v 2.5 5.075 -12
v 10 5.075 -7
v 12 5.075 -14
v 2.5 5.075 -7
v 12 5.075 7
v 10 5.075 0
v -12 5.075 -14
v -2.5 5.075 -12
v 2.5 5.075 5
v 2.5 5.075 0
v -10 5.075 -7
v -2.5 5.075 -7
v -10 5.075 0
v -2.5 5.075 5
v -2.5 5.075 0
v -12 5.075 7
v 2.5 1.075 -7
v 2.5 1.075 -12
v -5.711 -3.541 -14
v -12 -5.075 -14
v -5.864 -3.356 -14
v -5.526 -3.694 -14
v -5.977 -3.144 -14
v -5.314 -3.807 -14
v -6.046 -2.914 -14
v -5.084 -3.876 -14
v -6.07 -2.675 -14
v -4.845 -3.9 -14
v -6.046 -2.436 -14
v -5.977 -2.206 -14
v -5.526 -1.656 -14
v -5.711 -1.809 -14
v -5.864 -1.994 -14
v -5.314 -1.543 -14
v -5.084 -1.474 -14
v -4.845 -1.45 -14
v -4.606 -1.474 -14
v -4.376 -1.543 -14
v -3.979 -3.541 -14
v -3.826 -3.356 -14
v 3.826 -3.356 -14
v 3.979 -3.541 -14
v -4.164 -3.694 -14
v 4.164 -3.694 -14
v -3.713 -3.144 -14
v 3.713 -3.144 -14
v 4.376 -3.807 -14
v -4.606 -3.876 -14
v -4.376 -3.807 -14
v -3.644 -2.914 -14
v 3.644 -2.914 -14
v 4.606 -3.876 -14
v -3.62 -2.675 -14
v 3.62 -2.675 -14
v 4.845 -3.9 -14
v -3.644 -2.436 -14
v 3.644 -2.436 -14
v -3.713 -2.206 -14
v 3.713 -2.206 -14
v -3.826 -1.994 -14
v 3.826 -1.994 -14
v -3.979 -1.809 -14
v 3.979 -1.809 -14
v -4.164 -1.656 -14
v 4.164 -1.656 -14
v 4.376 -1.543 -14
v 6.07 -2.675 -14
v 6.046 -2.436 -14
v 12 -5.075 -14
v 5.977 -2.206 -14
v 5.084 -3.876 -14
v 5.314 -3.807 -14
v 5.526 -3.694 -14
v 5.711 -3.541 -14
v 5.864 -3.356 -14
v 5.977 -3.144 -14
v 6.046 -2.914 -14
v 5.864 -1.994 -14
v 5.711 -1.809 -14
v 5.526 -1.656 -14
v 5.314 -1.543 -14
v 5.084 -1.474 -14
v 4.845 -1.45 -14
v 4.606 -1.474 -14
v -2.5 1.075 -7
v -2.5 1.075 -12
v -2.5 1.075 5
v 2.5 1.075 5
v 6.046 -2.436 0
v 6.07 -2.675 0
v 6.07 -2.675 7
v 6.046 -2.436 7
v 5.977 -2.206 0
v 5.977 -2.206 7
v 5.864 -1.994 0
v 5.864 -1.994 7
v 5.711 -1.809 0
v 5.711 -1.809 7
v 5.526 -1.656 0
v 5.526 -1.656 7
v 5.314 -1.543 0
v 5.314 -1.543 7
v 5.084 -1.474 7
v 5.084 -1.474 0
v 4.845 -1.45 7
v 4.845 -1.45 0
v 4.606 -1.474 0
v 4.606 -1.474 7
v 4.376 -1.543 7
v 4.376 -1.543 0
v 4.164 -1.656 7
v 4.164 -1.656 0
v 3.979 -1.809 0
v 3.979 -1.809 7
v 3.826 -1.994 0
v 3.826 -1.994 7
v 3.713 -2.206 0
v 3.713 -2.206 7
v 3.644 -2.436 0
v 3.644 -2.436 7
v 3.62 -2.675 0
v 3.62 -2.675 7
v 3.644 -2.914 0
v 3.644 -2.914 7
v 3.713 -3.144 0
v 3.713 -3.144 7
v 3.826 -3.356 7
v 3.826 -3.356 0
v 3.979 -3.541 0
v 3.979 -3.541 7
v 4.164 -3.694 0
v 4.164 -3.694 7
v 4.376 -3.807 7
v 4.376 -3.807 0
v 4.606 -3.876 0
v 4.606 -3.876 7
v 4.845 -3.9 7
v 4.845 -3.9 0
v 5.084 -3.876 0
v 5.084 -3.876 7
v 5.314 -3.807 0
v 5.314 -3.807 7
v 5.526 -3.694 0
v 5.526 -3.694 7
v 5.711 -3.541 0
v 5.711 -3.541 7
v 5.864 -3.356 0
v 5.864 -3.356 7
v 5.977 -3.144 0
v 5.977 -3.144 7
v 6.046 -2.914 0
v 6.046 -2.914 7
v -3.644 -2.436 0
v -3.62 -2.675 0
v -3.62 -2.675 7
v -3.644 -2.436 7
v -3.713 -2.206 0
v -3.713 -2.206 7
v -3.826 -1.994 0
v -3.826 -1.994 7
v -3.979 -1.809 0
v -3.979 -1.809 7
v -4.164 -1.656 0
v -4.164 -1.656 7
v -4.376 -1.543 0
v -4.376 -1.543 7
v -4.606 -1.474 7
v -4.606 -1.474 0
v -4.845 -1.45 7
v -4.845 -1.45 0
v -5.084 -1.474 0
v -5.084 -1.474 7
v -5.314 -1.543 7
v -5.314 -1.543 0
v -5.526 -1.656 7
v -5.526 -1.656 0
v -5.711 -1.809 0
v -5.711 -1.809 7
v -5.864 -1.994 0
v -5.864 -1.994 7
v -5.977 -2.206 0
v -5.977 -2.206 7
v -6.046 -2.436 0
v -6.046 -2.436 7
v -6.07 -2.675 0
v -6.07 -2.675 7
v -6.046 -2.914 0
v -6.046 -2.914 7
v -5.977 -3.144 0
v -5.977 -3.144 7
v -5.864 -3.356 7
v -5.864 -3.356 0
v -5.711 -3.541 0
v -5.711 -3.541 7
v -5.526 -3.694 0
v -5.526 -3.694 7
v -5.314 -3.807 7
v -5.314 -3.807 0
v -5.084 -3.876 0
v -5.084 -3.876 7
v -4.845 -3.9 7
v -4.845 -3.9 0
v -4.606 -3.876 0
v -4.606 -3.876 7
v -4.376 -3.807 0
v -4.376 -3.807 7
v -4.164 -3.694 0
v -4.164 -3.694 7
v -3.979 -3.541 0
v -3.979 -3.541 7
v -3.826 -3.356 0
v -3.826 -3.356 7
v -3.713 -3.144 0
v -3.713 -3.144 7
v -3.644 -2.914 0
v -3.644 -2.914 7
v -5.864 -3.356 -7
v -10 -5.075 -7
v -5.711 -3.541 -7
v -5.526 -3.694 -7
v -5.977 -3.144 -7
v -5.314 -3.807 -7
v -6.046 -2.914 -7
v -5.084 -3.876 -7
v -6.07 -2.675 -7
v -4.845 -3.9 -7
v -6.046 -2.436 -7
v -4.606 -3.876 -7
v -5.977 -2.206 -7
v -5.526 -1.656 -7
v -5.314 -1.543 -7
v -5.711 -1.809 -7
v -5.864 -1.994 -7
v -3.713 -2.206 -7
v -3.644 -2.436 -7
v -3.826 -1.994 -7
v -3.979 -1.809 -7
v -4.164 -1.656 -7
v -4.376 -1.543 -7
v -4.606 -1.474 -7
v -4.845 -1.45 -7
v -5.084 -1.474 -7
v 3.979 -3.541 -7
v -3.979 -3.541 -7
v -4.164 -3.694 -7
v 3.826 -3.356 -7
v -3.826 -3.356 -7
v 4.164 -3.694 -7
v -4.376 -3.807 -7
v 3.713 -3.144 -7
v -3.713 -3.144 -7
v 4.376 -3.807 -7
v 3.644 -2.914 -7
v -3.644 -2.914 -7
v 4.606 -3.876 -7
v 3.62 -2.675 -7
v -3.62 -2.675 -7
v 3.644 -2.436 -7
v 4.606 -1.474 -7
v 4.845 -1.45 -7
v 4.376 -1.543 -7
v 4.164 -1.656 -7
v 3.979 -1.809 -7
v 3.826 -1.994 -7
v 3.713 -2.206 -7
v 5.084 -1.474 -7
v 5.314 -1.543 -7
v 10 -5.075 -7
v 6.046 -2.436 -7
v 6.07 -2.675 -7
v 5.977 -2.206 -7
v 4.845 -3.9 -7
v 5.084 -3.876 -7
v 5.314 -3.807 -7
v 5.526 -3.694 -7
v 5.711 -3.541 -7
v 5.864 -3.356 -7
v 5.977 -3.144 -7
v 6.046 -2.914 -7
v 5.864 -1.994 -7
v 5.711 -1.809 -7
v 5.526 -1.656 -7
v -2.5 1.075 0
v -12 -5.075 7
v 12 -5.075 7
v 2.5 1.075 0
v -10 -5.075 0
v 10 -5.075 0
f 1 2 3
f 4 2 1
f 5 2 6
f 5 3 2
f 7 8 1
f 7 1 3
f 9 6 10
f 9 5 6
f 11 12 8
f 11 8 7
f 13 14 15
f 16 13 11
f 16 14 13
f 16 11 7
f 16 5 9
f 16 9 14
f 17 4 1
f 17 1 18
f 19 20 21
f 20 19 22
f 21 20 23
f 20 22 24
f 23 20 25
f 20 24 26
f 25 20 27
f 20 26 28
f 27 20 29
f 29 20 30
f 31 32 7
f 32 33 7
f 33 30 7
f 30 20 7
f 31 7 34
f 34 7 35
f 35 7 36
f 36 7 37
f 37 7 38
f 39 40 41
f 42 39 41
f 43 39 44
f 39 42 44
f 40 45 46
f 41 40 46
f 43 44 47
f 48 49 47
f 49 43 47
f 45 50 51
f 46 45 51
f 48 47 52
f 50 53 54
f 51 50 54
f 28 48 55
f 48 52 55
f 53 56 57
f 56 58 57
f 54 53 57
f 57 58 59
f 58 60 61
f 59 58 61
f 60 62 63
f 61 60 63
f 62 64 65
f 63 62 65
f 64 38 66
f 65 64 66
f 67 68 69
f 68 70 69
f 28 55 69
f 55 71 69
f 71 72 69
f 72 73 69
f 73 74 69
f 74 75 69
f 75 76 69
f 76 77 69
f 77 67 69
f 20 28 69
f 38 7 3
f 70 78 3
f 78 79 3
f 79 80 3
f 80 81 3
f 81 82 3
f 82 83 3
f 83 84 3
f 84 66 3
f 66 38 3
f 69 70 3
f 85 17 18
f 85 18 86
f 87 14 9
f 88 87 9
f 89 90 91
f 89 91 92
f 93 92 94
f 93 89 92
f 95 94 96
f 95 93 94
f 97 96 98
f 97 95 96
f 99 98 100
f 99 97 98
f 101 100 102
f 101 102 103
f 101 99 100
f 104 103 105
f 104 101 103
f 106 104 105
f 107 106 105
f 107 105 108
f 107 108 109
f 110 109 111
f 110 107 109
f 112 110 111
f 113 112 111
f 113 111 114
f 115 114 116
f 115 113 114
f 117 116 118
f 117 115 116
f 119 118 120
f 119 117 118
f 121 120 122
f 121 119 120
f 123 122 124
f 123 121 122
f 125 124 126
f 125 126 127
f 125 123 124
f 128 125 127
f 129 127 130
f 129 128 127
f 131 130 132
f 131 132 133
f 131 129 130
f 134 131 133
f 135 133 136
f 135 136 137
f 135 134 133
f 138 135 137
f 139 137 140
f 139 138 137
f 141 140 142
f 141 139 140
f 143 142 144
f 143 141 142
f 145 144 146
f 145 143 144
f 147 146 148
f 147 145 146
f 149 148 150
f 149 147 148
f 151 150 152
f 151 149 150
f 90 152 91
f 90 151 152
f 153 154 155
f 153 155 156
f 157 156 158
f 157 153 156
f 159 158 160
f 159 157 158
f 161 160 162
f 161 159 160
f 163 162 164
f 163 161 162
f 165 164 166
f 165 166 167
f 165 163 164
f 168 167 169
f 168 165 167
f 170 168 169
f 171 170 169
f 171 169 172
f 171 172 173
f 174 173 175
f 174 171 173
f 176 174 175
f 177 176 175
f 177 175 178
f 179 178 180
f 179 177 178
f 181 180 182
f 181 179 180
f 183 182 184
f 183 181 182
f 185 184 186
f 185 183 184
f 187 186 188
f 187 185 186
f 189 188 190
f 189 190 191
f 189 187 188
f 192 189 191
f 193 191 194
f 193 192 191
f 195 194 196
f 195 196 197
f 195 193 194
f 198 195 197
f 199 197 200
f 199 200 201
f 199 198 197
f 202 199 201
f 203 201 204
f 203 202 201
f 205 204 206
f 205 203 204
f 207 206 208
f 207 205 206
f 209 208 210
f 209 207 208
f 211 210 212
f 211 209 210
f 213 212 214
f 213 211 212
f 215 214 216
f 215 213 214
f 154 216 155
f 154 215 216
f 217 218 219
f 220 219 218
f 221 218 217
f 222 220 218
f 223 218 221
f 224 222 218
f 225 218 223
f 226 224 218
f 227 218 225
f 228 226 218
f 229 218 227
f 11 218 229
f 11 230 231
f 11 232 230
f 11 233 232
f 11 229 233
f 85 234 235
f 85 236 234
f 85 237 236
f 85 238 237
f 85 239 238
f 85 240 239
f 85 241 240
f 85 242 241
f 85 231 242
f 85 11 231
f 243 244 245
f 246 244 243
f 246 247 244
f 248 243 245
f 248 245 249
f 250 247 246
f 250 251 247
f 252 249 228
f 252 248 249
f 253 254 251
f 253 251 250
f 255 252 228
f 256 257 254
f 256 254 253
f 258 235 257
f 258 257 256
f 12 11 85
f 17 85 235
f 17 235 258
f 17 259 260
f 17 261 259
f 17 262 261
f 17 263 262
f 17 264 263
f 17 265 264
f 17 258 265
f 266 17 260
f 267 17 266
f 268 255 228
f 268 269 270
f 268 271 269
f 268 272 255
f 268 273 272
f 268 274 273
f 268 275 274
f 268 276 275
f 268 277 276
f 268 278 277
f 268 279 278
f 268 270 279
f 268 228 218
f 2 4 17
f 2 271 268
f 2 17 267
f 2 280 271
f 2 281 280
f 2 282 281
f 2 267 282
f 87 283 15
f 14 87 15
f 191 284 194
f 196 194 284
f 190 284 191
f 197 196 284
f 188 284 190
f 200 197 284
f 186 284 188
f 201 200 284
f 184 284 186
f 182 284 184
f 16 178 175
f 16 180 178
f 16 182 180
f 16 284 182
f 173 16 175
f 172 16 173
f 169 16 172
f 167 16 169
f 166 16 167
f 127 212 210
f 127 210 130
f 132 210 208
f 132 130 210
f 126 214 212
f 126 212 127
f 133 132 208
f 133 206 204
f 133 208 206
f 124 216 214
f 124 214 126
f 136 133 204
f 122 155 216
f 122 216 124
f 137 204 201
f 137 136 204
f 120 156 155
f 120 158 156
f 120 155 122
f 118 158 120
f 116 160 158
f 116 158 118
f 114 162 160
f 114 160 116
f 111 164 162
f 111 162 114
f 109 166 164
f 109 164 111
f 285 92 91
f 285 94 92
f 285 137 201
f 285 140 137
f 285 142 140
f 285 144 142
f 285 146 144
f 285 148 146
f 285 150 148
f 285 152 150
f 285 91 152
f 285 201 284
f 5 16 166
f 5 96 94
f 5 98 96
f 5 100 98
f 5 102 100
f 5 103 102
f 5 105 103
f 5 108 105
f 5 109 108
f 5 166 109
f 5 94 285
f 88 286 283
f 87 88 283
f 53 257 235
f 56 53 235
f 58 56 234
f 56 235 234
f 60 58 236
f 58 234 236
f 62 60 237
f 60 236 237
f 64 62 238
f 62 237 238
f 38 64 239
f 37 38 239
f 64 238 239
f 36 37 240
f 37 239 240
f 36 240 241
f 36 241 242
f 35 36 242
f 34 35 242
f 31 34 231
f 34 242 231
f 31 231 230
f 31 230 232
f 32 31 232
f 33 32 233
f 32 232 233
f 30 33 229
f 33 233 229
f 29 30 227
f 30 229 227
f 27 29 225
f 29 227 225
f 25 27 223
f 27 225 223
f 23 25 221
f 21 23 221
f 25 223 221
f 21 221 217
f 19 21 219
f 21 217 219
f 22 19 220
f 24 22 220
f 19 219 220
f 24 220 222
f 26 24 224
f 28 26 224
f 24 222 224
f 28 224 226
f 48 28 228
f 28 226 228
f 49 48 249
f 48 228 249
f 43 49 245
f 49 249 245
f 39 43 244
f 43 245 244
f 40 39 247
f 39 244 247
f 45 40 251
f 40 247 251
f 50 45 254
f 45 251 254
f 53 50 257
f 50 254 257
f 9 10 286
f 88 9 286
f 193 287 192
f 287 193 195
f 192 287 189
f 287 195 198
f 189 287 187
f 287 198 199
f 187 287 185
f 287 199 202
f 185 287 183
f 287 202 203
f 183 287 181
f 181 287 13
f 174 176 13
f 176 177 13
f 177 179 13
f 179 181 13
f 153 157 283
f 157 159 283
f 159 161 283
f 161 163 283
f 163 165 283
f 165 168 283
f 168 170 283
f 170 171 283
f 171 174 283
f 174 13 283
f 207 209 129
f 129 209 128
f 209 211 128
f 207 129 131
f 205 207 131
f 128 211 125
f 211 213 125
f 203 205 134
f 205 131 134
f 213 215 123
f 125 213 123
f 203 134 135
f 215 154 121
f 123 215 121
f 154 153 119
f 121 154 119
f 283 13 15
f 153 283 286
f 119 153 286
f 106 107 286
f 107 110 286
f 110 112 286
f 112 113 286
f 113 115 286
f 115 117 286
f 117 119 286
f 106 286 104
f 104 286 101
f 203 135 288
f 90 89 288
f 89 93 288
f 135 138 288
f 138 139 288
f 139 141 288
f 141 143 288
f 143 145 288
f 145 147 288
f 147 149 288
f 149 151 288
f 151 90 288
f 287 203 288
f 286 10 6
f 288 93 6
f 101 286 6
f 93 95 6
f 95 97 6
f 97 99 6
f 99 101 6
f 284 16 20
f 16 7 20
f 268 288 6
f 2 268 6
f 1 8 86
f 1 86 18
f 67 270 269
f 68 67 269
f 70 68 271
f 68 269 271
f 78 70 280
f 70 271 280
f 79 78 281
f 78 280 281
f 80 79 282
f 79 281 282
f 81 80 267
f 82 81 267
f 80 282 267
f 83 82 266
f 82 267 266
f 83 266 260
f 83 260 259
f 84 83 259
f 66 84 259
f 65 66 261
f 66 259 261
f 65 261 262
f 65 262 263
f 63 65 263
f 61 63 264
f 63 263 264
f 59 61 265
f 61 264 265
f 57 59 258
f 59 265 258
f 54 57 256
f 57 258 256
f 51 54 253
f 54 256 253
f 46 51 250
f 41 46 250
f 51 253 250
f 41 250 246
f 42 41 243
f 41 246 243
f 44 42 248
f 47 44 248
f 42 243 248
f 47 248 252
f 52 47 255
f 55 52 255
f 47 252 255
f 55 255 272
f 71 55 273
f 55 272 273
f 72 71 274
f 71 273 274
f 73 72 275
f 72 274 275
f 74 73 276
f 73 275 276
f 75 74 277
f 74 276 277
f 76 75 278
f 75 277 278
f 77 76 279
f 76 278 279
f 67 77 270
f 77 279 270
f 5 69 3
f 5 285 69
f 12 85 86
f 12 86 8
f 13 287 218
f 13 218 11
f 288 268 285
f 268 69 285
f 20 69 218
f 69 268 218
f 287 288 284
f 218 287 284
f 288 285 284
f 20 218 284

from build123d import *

# Parameters (mm, degrees)
ESQUISSE2_R        = 1.225
BOSS_EXTRU_1_DEPTH = 7
ESQUISSE3_W        = 5
ESQUISSE3_H        = 4
BOSS_EXTRU_2_DEPTH = 2
ESQUISSE5_W        = 2
ESQUISSE5_H        = 10.15
BOSS_EXTRU_3_DEPTH = 7


with BuildPart() as part:
    # Esquisse2 → Boss.-Extru.1 (new body)
    with BuildSketch(Plane.XY):
        Polygon((12, 5.075), (2.5, 5.075), (2.5, 1.075), (-2.5, 1.075), (-2.5, 5.075), (-12, 5.075), (-12, -5.075), (12, -5.075), align=None)
        with Locations((4.845, -2.675)):
            Circle(ESQUISSE2_R, mode=Mode.SUBTRACT)
        with Locations((-4.845, -2.675)):
            Circle(ESQUISSE2_R, mode=Mode.SUBTRACT)
    extrude(amount=BOSS_EXTRU_1_DEPTH)

    # Esquisse3 → Boss.-Extru.2 (add)
    with BuildSketch(Plane.XY.offset(7)):
        with Locations((0, 3.075)):
            Rectangle(ESQUISSE3_W, ESQUISSE3_H)
    extrude(amount=-BOSS_EXTRU_2_DEPTH)

    # Esquisse5 → Boss.-Extru.3 (add)
    with BuildSketch(Plane(origin=(0, 0, 0), x_dir=(-1, 0, 0), z_dir=(0, 0, -1))):
        with Locations((-11, 0)):
            Rectangle(ESQUISSE5_W, ESQUISSE5_H)
        with Locations((11, 0)):
            Rectangle(ESQUISSE5_W, ESQUISSE5_H)
    extrude(amount=BOSS_EXTRU_3_DEPTH)

    # Symétrie1: part across plane


with BuildPart() as part_1:
    add(part.part)
    add(part.part.mirror(Plane(origin=(0, 0, -3.5), x_dir=(1, 0, 0), z_dir=(0, 0, -1))))


solid = part_1.part
